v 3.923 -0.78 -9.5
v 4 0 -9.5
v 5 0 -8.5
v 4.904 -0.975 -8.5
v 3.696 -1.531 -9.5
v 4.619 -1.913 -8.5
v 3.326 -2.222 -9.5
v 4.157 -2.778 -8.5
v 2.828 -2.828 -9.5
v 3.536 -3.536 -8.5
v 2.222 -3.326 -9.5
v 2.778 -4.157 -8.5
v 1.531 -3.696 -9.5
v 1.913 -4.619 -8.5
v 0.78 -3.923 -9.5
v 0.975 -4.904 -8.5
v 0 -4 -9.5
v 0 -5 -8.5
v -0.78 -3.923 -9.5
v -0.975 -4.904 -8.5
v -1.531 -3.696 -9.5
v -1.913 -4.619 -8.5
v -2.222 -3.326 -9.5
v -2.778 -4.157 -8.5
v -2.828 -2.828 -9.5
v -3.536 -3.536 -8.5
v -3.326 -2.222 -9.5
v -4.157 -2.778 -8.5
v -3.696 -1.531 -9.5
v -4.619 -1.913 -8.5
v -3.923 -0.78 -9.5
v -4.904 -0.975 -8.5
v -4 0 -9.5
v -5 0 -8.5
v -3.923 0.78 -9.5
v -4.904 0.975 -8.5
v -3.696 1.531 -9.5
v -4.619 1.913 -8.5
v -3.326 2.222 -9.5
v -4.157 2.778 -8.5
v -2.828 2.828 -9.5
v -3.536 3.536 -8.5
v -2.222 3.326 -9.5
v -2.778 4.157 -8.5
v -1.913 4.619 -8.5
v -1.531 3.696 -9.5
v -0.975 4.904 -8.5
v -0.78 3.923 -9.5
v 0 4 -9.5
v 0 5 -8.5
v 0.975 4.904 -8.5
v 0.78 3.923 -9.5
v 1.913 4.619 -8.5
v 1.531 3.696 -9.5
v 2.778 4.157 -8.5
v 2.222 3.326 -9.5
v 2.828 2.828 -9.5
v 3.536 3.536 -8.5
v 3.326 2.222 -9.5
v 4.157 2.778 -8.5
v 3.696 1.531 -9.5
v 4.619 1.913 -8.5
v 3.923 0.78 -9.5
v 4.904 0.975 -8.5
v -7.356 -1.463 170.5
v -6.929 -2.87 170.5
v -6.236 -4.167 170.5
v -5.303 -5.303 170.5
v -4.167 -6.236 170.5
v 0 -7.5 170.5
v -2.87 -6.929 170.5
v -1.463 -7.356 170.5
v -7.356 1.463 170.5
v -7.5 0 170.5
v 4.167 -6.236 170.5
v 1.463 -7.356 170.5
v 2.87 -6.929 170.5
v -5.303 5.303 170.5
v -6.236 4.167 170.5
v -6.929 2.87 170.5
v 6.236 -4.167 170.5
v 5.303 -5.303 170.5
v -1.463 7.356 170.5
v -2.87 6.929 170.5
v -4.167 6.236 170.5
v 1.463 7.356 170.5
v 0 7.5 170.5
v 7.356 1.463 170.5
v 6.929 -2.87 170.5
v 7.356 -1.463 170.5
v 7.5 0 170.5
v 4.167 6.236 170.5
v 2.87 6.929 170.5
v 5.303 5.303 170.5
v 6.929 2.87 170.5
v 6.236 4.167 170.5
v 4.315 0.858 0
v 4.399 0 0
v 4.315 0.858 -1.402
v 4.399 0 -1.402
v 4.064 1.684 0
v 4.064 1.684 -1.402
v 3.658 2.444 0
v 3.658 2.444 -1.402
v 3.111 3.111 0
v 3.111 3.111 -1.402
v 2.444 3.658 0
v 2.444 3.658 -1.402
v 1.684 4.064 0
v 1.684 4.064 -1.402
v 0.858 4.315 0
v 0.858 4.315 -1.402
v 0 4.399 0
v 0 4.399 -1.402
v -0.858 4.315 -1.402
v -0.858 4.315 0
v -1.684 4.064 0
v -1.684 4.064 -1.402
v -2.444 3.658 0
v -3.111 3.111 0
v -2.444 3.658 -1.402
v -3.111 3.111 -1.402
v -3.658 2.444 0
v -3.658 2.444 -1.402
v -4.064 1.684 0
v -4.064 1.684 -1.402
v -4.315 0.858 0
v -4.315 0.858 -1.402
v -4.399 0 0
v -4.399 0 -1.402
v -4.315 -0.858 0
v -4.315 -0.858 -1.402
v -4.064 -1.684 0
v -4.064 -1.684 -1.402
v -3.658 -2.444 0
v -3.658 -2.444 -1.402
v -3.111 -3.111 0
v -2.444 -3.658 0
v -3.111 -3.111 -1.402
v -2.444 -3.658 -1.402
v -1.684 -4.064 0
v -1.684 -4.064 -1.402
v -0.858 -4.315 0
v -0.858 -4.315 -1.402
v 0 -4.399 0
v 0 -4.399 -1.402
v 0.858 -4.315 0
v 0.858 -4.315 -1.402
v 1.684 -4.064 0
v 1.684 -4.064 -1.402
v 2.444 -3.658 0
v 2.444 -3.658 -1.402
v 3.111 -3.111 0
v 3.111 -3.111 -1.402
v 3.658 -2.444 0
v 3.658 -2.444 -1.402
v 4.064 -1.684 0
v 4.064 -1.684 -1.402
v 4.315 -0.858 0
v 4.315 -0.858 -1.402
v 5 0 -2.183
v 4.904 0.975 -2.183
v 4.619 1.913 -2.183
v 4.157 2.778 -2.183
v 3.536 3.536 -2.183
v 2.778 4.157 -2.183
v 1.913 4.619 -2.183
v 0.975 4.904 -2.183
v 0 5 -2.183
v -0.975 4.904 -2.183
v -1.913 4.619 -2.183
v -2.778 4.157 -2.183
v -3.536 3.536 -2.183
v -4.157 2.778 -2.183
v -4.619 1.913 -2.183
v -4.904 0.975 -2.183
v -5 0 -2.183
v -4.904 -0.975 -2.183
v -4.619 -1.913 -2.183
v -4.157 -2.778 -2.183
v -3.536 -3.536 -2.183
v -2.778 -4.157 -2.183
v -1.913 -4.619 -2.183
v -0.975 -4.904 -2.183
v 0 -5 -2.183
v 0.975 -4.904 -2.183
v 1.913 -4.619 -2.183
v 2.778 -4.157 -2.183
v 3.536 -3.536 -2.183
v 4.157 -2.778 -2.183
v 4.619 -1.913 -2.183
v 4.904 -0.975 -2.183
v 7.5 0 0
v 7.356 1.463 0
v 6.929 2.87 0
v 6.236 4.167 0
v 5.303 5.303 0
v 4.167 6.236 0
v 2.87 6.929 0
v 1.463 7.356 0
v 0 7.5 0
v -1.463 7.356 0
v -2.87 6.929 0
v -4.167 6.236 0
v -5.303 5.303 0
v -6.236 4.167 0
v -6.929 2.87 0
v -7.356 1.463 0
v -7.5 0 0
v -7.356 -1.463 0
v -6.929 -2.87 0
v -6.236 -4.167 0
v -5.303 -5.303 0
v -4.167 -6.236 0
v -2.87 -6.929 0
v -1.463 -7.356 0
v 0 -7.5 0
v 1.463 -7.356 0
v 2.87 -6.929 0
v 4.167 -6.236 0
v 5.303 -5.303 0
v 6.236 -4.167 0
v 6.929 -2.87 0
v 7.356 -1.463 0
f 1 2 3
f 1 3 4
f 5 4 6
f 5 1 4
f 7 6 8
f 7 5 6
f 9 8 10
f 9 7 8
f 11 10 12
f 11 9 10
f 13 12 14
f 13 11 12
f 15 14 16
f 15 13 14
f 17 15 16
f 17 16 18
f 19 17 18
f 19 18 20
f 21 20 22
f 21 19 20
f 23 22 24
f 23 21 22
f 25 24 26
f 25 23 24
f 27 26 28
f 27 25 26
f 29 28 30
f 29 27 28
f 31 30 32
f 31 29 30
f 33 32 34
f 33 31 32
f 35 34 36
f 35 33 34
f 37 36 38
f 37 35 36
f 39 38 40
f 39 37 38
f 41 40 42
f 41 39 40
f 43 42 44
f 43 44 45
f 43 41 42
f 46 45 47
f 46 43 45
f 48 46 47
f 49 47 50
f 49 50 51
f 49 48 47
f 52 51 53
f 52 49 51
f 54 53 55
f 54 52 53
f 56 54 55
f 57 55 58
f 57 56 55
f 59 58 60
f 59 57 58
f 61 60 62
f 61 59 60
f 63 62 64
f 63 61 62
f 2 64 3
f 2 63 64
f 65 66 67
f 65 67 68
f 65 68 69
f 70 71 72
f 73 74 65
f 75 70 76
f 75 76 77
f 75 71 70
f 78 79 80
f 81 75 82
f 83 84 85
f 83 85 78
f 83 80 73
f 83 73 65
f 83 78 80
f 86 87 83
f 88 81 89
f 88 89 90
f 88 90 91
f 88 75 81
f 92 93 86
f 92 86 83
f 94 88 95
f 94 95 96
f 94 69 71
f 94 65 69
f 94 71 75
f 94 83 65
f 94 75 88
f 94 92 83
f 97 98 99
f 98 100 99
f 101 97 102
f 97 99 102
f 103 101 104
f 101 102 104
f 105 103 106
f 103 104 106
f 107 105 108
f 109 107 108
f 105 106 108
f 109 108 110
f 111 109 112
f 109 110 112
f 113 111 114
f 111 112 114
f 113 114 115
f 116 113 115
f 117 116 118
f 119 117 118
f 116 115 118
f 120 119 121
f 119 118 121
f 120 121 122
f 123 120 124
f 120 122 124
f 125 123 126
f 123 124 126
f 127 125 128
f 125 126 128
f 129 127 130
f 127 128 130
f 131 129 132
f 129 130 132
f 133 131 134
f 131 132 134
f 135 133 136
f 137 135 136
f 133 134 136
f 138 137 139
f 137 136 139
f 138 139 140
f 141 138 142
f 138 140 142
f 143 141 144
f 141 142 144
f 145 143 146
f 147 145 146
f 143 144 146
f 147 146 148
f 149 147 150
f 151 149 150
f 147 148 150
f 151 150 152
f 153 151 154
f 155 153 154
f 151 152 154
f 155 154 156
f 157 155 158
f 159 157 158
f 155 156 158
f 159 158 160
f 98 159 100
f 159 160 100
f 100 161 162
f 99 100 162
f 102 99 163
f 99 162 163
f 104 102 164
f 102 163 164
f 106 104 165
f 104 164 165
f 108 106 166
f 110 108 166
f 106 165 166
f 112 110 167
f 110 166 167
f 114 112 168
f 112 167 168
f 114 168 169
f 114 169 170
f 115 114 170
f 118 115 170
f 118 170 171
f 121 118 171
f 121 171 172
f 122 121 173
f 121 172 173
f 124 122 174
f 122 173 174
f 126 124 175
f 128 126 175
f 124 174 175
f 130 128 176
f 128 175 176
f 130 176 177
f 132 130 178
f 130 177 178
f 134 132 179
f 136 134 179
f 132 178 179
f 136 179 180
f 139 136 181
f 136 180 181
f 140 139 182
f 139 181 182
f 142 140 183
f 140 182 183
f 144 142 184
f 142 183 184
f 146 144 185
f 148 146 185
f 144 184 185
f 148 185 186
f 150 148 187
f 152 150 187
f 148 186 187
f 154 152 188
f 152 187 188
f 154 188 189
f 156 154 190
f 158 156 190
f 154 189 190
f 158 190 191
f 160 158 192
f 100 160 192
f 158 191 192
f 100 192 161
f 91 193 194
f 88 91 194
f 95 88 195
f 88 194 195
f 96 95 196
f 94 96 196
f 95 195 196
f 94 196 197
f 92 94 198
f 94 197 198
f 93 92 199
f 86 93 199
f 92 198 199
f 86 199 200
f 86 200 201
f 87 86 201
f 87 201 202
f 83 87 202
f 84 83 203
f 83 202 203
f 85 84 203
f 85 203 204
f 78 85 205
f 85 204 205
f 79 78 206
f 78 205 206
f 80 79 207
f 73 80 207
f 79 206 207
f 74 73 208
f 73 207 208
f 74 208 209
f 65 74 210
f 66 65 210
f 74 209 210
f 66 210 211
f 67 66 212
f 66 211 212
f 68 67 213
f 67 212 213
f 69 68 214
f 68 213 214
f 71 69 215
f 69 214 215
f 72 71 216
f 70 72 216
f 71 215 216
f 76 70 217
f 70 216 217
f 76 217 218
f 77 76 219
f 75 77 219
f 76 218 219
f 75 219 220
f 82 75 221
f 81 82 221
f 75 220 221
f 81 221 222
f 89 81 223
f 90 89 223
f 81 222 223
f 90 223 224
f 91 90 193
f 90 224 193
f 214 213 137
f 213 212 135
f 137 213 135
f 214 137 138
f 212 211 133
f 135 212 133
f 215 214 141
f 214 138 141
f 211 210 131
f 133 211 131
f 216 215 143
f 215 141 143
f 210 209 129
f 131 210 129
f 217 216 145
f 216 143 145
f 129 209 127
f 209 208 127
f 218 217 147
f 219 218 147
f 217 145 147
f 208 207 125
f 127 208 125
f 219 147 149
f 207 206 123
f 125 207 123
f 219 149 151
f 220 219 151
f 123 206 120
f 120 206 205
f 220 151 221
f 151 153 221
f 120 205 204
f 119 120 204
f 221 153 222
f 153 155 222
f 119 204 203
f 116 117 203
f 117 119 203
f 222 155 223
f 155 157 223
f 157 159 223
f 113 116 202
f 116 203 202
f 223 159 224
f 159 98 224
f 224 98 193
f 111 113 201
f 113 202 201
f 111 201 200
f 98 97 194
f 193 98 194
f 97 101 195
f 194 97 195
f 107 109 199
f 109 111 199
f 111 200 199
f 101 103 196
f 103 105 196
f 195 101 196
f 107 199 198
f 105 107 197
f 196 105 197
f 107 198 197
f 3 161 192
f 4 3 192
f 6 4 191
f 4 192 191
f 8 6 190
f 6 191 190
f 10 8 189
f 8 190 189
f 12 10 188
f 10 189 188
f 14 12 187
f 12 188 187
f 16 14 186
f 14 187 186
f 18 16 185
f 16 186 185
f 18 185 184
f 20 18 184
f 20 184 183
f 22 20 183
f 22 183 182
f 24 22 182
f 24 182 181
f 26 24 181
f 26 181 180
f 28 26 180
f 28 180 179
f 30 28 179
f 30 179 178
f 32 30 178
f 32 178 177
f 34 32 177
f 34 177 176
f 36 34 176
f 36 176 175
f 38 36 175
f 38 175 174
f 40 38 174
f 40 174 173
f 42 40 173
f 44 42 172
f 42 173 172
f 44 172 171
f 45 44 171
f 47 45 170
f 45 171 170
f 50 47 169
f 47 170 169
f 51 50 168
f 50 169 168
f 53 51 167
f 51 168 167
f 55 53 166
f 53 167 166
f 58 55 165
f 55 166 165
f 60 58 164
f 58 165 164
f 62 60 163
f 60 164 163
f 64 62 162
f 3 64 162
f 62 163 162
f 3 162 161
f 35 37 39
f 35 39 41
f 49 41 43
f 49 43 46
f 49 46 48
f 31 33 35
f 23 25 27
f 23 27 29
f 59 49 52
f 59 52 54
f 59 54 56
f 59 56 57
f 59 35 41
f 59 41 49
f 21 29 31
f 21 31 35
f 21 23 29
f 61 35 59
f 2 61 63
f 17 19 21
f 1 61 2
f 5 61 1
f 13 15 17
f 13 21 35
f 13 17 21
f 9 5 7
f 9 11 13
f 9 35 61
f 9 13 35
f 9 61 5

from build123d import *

# Parameters (mm, degrees)
F0_R     = 7.5
F1_DEPTH = 170.5
F2_R     = 5
F3_DEPTH = 9.5
F4_SIZE  = 1


with BuildPart() as f1:
    # F0 (on Top) → F1 (new body)
    with BuildSketch(Plane.XY):
        Circle(F0_R)
    extrude(amount=F1_DEPTH)

    # F2 (on face) → F3 (join)
    with BuildSketch(Plane(origin=(0, 0, 0), x_dir=(1, 0, 0), z_dir=(0, 0, -1))):
        Circle(F2_R)
    extrude(amount=F3_DEPTH)

    # F4
    f4_edges = [f1.edges().sort_by_distance(p)[0] for p in [
        (-5, 0, -9.5),
    ]]
    chamfer(f4_edges, length=F4_SIZE)

    # F5 (on Front) → F6 (revolve, cut)
    with BuildSketch(Plane.XZ):
        Polygon((4.399378, -1.402452), (5.027703, -2.219274), (5.142896, -2.219274), (5.142896, 0), (4.399378, 0), align=None)
    revolve(axis=Axis((0, 0, 0), (0, 0, 1)), mode=Mode.SUBTRACT)


solid = f1.part
